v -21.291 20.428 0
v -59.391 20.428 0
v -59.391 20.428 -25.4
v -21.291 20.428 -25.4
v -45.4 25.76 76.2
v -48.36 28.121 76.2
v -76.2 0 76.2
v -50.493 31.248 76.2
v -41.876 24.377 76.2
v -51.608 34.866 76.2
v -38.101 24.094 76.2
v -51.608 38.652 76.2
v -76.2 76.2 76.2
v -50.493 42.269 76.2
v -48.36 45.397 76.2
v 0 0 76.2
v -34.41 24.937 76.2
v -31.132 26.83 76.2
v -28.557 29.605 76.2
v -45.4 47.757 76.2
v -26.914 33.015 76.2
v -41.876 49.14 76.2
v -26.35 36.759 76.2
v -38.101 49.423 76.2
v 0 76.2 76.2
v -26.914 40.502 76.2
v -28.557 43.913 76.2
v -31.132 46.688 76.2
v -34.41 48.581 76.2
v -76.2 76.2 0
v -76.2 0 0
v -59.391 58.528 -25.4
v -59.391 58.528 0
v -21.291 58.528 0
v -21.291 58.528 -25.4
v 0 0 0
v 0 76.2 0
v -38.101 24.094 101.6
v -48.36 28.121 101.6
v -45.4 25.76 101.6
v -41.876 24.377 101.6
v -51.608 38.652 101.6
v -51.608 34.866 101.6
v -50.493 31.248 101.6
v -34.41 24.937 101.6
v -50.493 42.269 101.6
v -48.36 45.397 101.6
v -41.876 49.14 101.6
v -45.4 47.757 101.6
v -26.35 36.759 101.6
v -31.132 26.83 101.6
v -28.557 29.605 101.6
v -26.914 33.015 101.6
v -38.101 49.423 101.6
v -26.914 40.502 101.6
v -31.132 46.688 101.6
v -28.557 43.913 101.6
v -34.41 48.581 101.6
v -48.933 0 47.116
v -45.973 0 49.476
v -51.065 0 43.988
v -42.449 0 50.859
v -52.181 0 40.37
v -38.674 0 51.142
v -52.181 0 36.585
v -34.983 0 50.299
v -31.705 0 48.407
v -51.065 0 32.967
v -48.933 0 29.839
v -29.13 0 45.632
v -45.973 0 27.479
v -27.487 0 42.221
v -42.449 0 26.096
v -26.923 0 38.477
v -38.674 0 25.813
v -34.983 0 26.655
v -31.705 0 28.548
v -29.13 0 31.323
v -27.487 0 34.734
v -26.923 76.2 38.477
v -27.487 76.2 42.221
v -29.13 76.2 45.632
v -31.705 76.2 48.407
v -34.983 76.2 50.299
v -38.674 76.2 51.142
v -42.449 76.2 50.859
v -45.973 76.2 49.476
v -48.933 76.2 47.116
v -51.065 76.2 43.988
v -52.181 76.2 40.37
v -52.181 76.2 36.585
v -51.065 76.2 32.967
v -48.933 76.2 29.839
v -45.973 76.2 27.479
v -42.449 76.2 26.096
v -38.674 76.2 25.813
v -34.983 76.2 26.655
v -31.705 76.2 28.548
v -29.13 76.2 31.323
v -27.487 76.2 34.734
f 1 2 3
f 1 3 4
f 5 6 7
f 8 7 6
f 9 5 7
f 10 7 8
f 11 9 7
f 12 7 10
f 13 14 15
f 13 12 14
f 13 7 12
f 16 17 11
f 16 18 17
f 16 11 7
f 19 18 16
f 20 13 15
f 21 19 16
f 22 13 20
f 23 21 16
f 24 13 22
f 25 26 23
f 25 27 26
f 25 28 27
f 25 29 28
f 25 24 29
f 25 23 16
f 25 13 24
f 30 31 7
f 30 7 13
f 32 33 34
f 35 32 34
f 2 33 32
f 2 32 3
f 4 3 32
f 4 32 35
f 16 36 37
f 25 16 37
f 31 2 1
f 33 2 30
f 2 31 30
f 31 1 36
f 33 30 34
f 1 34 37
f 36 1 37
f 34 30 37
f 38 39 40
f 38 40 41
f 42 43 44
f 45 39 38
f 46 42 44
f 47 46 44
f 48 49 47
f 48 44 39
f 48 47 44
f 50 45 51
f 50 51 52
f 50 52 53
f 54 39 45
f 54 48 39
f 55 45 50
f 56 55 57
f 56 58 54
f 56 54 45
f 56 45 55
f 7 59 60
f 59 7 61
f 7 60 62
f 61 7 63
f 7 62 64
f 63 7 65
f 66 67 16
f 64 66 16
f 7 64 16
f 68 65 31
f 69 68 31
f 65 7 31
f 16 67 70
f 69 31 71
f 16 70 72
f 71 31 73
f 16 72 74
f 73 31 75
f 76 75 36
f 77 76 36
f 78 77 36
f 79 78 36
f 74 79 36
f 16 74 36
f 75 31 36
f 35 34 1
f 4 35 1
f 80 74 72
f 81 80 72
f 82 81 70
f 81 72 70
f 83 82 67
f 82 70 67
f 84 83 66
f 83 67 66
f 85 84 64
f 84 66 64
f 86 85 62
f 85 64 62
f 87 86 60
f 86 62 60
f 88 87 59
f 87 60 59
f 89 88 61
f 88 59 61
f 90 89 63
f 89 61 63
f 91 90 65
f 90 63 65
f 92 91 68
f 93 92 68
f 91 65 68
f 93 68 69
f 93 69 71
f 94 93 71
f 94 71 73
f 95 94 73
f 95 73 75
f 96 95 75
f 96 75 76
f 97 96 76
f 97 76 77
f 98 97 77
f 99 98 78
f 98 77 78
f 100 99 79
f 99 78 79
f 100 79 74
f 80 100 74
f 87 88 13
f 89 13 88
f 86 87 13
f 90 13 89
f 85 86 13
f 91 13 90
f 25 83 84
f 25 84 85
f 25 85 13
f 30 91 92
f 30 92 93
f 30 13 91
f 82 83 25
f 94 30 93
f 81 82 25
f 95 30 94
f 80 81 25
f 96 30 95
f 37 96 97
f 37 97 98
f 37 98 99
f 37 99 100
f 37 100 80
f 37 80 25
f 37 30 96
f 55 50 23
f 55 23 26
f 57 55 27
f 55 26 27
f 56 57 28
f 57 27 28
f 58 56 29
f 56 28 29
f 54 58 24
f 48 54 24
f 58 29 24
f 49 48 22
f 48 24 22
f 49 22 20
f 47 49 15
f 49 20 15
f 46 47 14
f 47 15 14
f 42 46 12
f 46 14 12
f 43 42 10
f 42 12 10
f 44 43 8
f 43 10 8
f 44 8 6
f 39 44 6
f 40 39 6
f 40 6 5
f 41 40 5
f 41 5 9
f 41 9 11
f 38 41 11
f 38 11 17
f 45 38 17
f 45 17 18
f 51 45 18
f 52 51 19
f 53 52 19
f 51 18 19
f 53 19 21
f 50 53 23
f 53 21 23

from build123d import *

# Parameters (mm, degrees)
F0_W     = 76.2
F0_H     = 76.2
F1_DEPTH = 76.2
F2_R     = 12.7
F3_DEPTH = 76.2
F4_R     = 12.7
F5_DEPTH = 25.4
F6_W     = 38.1
F6_H     = 38.1
F7_DEPTH = 25.4


with BuildPart() as f1:
    # F0 (on Top) → F1 (new body)
    with BuildSketch(Plane.XY):
        with Locations((-38.1, 38.1)):
            Rectangle(F0_W, F0_H)
    extrude(amount=F1_DEPTH)

    # F2 (on face) → F3 (cut)
    with BuildSketch(Plane.XZ):
        with Locations((-39.623093, 38.477365)):
            Circle(F2_R)
    extrude(amount=-F3_DEPTH, mode=Mode.SUBTRACT)

    # F4 (on face) → F5 (join)
    with BuildSketch(Plane.XY.offset(76.2)):
        with Locations((-39.050225, 36.758773)):
            Circle(F4_R)
    extrude(amount=F5_DEPTH)

    # F6 (on face) → F7 (join)
    with BuildSketch(Plane(origin=(0, 0, 0), x_dir=(1, 0, 0), z_dir=(0, 0, -1))):
        with Locations((-40.341444, -39.477604)):
            Rectangle(F6_W, F6_H)
    extrude(amount=F7_DEPTH)


solid = f1.part
